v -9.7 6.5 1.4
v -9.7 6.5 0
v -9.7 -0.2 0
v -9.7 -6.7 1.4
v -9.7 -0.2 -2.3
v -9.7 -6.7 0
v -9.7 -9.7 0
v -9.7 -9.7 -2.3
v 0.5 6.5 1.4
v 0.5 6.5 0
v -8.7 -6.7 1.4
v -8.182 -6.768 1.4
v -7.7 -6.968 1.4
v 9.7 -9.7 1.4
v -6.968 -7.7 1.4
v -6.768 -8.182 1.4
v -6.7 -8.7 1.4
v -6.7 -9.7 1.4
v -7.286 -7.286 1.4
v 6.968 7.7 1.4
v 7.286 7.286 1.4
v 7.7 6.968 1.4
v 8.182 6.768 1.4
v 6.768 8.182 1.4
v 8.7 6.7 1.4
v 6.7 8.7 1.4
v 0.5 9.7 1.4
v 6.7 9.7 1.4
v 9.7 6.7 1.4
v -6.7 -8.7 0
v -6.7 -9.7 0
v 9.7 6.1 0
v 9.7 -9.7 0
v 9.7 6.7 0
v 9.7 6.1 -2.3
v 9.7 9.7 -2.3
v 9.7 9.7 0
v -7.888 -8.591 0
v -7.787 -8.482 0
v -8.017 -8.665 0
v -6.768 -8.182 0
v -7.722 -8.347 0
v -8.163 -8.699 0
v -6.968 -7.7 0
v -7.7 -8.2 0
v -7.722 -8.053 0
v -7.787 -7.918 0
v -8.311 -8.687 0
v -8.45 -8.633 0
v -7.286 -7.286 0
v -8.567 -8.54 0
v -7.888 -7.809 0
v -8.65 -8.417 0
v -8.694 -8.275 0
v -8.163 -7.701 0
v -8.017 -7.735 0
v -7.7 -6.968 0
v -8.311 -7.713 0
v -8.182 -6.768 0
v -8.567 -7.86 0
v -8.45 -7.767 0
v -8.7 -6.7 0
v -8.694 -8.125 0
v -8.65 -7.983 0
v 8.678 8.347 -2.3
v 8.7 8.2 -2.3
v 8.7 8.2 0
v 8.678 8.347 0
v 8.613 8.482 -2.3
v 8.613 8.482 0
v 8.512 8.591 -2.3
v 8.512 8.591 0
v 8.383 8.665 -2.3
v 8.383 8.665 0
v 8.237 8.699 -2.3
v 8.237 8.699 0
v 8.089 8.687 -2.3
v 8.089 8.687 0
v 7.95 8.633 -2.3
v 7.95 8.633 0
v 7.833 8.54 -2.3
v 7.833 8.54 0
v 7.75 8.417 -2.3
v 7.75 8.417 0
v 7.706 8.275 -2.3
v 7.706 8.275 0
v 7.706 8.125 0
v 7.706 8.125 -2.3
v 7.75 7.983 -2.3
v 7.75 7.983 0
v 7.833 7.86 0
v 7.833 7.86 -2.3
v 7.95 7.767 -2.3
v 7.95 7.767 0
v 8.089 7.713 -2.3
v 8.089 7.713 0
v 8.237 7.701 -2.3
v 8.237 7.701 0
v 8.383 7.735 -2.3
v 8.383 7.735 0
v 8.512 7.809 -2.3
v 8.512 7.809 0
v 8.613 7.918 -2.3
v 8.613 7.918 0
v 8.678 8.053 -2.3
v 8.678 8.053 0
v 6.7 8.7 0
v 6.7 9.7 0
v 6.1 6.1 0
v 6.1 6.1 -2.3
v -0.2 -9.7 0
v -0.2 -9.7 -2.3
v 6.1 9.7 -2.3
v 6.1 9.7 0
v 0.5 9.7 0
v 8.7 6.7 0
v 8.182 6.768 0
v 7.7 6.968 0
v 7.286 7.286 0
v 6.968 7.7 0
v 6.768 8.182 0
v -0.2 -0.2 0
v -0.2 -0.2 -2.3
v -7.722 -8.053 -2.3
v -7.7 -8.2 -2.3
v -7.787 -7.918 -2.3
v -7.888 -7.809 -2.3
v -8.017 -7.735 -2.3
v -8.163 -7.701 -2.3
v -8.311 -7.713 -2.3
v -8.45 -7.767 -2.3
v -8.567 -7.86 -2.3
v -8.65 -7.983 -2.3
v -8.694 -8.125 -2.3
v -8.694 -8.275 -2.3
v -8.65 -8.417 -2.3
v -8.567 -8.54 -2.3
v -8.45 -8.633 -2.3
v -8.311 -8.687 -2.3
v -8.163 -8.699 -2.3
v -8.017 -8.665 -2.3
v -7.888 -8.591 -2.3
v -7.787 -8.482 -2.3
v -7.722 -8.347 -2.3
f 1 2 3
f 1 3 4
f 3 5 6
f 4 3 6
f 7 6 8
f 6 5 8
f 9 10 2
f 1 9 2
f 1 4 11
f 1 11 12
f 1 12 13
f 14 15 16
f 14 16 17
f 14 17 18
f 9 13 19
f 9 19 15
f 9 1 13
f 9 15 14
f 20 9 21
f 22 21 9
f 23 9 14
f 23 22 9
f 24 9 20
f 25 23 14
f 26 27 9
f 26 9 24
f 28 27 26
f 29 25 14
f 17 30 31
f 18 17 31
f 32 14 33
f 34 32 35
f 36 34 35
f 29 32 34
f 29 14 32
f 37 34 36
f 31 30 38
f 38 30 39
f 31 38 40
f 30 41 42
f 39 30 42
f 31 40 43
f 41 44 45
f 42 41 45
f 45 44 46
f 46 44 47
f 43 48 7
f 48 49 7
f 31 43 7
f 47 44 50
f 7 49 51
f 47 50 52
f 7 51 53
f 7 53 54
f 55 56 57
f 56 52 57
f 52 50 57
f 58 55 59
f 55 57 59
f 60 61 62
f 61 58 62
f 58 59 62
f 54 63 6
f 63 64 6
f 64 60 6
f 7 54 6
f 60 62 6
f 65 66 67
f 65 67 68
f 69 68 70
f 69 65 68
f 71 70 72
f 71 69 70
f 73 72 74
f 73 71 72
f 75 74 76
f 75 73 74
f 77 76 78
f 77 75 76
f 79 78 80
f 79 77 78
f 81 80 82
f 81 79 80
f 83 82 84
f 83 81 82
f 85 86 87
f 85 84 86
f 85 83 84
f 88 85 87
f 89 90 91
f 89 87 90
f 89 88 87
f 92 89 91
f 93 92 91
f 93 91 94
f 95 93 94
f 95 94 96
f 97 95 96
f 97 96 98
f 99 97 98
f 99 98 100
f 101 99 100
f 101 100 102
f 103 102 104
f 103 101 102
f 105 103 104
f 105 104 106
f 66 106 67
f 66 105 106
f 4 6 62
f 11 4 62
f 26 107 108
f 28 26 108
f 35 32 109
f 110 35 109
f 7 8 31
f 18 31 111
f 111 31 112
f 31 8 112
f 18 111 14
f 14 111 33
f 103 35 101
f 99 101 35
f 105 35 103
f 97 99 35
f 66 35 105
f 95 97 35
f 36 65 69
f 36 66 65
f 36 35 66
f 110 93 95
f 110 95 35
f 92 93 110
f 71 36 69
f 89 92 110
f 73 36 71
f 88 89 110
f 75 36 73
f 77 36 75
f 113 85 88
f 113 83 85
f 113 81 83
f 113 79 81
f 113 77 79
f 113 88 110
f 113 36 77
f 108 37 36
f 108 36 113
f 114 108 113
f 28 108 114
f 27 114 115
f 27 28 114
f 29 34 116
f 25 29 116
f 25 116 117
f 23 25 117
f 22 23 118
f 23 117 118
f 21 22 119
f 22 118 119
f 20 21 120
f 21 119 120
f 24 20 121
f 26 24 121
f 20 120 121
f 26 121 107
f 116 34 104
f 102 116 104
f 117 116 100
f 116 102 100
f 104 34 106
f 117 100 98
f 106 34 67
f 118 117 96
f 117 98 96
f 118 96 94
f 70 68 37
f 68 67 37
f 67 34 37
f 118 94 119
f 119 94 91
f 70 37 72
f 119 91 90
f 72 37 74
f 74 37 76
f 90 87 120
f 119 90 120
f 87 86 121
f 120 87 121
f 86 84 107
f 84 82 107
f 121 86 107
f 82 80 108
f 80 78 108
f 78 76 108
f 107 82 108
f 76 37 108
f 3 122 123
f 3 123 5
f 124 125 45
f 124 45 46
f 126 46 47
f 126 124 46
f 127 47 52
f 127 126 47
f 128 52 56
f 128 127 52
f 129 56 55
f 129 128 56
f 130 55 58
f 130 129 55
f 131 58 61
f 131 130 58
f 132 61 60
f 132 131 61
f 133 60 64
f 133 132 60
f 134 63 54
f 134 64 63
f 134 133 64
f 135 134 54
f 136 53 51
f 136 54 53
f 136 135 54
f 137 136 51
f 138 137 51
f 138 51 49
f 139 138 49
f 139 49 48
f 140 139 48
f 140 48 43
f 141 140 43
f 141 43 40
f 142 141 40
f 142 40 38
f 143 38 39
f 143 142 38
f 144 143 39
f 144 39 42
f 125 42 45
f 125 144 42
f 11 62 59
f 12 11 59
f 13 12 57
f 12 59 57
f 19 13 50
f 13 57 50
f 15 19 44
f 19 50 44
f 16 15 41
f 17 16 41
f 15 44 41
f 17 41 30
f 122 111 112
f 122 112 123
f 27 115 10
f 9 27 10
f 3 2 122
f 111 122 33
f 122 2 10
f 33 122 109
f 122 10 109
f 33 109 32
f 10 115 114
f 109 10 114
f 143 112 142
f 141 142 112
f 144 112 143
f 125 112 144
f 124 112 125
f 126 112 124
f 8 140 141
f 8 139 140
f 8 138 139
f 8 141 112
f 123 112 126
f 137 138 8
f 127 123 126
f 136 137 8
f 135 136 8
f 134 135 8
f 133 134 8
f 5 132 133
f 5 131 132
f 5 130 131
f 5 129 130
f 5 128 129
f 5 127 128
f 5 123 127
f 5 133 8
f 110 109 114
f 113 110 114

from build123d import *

# Parameters (mm, degrees)
BOSS_EXTRUDE2_DEPTH     = 1.4
SKETCH2_W               = 3.6
SKETCH2_H               = 3.6
SKETCH2_W_2             = 9.5
SKETCH2_H_2             = 9.5
BOSS_EXTRUDE3_DEPTH     = 2.3
CUT_EXTRUDE1_DEPTH      = 14.909349374
CUT_EXTRUDE1_DEPTH_BACK = 14.909349374
SKETCH4_R               = 0.5


with BuildPart() as part:
    # Sketch1 → Boss-Extrude2 (new body)
    with BuildSketch(Plane.XY):
        with BuildLine():
            Line((-6.7, -9.7), (9.7, -9.7))
            Line((9.7, -9.7), (9.7, 6.7))
            Line((9.7, 6.7), (8.7, 6.7))
            ThreePointArc((8.7, 6.7), (7.285786438, 7.285786438), (6.7, 8.7))
            Line((6.7, 8.7), (6.7, 9.7))
            Line((6.7, 9.7), (0.5, 9.7))
            Line((0.5, 9.7), (0.5, 6.5))
            Line((0.5, 6.5), (-9.7, 6.5))
            Line((-9.7, 6.5), (-9.7, -6.7))
            Line((-9.7, -6.7), (-8.7, -6.7))
            ThreePointArc((-8.7, -6.7), (-7.285786438, -7.285786438), (-6.7, -8.7))
            Line((-6.7, -8.7), (-6.7, -9.7))
        make_face()
    extrude(amount=BOSS_EXTRUDE2_DEPTH)

    # Sketch2 → Boss-Extrude3 (add)
    with BuildSketch(Plane(origin=(0, 0, 0), x_dir=(-1, 0, 0), z_dir=(0, 0, -1))):
        with Locations((-7.9, 7.9)):
            Rectangle(SKETCH2_W, SKETCH2_H)
        with Locations((4.95, -4.95)):
            Rectangle(SKETCH2_W_2, SKETCH2_H_2)
    extrude(amount=BOSS_EXTRUDE3_DEPTH)

    # Sketch4 → Cut-Extrude1 (cut, two sides: drawn at the far end of the back side and taken through both)
    with BuildSketch(Plane.XY.offset(-CUT_EXTRUDE1_DEPTH_BACK)):
        with Locations((8.2, 8.2)):
            Circle(SKETCH4_R)
        with Locations((-8.2, -8.2)):
            Circle(SKETCH4_R)
    extrude(amount=CUT_EXTRUDE1_DEPTH + CUT_EXTRUDE1_DEPTH_BACK, mode=Mode.SUBTRACT)


solid = part.part
